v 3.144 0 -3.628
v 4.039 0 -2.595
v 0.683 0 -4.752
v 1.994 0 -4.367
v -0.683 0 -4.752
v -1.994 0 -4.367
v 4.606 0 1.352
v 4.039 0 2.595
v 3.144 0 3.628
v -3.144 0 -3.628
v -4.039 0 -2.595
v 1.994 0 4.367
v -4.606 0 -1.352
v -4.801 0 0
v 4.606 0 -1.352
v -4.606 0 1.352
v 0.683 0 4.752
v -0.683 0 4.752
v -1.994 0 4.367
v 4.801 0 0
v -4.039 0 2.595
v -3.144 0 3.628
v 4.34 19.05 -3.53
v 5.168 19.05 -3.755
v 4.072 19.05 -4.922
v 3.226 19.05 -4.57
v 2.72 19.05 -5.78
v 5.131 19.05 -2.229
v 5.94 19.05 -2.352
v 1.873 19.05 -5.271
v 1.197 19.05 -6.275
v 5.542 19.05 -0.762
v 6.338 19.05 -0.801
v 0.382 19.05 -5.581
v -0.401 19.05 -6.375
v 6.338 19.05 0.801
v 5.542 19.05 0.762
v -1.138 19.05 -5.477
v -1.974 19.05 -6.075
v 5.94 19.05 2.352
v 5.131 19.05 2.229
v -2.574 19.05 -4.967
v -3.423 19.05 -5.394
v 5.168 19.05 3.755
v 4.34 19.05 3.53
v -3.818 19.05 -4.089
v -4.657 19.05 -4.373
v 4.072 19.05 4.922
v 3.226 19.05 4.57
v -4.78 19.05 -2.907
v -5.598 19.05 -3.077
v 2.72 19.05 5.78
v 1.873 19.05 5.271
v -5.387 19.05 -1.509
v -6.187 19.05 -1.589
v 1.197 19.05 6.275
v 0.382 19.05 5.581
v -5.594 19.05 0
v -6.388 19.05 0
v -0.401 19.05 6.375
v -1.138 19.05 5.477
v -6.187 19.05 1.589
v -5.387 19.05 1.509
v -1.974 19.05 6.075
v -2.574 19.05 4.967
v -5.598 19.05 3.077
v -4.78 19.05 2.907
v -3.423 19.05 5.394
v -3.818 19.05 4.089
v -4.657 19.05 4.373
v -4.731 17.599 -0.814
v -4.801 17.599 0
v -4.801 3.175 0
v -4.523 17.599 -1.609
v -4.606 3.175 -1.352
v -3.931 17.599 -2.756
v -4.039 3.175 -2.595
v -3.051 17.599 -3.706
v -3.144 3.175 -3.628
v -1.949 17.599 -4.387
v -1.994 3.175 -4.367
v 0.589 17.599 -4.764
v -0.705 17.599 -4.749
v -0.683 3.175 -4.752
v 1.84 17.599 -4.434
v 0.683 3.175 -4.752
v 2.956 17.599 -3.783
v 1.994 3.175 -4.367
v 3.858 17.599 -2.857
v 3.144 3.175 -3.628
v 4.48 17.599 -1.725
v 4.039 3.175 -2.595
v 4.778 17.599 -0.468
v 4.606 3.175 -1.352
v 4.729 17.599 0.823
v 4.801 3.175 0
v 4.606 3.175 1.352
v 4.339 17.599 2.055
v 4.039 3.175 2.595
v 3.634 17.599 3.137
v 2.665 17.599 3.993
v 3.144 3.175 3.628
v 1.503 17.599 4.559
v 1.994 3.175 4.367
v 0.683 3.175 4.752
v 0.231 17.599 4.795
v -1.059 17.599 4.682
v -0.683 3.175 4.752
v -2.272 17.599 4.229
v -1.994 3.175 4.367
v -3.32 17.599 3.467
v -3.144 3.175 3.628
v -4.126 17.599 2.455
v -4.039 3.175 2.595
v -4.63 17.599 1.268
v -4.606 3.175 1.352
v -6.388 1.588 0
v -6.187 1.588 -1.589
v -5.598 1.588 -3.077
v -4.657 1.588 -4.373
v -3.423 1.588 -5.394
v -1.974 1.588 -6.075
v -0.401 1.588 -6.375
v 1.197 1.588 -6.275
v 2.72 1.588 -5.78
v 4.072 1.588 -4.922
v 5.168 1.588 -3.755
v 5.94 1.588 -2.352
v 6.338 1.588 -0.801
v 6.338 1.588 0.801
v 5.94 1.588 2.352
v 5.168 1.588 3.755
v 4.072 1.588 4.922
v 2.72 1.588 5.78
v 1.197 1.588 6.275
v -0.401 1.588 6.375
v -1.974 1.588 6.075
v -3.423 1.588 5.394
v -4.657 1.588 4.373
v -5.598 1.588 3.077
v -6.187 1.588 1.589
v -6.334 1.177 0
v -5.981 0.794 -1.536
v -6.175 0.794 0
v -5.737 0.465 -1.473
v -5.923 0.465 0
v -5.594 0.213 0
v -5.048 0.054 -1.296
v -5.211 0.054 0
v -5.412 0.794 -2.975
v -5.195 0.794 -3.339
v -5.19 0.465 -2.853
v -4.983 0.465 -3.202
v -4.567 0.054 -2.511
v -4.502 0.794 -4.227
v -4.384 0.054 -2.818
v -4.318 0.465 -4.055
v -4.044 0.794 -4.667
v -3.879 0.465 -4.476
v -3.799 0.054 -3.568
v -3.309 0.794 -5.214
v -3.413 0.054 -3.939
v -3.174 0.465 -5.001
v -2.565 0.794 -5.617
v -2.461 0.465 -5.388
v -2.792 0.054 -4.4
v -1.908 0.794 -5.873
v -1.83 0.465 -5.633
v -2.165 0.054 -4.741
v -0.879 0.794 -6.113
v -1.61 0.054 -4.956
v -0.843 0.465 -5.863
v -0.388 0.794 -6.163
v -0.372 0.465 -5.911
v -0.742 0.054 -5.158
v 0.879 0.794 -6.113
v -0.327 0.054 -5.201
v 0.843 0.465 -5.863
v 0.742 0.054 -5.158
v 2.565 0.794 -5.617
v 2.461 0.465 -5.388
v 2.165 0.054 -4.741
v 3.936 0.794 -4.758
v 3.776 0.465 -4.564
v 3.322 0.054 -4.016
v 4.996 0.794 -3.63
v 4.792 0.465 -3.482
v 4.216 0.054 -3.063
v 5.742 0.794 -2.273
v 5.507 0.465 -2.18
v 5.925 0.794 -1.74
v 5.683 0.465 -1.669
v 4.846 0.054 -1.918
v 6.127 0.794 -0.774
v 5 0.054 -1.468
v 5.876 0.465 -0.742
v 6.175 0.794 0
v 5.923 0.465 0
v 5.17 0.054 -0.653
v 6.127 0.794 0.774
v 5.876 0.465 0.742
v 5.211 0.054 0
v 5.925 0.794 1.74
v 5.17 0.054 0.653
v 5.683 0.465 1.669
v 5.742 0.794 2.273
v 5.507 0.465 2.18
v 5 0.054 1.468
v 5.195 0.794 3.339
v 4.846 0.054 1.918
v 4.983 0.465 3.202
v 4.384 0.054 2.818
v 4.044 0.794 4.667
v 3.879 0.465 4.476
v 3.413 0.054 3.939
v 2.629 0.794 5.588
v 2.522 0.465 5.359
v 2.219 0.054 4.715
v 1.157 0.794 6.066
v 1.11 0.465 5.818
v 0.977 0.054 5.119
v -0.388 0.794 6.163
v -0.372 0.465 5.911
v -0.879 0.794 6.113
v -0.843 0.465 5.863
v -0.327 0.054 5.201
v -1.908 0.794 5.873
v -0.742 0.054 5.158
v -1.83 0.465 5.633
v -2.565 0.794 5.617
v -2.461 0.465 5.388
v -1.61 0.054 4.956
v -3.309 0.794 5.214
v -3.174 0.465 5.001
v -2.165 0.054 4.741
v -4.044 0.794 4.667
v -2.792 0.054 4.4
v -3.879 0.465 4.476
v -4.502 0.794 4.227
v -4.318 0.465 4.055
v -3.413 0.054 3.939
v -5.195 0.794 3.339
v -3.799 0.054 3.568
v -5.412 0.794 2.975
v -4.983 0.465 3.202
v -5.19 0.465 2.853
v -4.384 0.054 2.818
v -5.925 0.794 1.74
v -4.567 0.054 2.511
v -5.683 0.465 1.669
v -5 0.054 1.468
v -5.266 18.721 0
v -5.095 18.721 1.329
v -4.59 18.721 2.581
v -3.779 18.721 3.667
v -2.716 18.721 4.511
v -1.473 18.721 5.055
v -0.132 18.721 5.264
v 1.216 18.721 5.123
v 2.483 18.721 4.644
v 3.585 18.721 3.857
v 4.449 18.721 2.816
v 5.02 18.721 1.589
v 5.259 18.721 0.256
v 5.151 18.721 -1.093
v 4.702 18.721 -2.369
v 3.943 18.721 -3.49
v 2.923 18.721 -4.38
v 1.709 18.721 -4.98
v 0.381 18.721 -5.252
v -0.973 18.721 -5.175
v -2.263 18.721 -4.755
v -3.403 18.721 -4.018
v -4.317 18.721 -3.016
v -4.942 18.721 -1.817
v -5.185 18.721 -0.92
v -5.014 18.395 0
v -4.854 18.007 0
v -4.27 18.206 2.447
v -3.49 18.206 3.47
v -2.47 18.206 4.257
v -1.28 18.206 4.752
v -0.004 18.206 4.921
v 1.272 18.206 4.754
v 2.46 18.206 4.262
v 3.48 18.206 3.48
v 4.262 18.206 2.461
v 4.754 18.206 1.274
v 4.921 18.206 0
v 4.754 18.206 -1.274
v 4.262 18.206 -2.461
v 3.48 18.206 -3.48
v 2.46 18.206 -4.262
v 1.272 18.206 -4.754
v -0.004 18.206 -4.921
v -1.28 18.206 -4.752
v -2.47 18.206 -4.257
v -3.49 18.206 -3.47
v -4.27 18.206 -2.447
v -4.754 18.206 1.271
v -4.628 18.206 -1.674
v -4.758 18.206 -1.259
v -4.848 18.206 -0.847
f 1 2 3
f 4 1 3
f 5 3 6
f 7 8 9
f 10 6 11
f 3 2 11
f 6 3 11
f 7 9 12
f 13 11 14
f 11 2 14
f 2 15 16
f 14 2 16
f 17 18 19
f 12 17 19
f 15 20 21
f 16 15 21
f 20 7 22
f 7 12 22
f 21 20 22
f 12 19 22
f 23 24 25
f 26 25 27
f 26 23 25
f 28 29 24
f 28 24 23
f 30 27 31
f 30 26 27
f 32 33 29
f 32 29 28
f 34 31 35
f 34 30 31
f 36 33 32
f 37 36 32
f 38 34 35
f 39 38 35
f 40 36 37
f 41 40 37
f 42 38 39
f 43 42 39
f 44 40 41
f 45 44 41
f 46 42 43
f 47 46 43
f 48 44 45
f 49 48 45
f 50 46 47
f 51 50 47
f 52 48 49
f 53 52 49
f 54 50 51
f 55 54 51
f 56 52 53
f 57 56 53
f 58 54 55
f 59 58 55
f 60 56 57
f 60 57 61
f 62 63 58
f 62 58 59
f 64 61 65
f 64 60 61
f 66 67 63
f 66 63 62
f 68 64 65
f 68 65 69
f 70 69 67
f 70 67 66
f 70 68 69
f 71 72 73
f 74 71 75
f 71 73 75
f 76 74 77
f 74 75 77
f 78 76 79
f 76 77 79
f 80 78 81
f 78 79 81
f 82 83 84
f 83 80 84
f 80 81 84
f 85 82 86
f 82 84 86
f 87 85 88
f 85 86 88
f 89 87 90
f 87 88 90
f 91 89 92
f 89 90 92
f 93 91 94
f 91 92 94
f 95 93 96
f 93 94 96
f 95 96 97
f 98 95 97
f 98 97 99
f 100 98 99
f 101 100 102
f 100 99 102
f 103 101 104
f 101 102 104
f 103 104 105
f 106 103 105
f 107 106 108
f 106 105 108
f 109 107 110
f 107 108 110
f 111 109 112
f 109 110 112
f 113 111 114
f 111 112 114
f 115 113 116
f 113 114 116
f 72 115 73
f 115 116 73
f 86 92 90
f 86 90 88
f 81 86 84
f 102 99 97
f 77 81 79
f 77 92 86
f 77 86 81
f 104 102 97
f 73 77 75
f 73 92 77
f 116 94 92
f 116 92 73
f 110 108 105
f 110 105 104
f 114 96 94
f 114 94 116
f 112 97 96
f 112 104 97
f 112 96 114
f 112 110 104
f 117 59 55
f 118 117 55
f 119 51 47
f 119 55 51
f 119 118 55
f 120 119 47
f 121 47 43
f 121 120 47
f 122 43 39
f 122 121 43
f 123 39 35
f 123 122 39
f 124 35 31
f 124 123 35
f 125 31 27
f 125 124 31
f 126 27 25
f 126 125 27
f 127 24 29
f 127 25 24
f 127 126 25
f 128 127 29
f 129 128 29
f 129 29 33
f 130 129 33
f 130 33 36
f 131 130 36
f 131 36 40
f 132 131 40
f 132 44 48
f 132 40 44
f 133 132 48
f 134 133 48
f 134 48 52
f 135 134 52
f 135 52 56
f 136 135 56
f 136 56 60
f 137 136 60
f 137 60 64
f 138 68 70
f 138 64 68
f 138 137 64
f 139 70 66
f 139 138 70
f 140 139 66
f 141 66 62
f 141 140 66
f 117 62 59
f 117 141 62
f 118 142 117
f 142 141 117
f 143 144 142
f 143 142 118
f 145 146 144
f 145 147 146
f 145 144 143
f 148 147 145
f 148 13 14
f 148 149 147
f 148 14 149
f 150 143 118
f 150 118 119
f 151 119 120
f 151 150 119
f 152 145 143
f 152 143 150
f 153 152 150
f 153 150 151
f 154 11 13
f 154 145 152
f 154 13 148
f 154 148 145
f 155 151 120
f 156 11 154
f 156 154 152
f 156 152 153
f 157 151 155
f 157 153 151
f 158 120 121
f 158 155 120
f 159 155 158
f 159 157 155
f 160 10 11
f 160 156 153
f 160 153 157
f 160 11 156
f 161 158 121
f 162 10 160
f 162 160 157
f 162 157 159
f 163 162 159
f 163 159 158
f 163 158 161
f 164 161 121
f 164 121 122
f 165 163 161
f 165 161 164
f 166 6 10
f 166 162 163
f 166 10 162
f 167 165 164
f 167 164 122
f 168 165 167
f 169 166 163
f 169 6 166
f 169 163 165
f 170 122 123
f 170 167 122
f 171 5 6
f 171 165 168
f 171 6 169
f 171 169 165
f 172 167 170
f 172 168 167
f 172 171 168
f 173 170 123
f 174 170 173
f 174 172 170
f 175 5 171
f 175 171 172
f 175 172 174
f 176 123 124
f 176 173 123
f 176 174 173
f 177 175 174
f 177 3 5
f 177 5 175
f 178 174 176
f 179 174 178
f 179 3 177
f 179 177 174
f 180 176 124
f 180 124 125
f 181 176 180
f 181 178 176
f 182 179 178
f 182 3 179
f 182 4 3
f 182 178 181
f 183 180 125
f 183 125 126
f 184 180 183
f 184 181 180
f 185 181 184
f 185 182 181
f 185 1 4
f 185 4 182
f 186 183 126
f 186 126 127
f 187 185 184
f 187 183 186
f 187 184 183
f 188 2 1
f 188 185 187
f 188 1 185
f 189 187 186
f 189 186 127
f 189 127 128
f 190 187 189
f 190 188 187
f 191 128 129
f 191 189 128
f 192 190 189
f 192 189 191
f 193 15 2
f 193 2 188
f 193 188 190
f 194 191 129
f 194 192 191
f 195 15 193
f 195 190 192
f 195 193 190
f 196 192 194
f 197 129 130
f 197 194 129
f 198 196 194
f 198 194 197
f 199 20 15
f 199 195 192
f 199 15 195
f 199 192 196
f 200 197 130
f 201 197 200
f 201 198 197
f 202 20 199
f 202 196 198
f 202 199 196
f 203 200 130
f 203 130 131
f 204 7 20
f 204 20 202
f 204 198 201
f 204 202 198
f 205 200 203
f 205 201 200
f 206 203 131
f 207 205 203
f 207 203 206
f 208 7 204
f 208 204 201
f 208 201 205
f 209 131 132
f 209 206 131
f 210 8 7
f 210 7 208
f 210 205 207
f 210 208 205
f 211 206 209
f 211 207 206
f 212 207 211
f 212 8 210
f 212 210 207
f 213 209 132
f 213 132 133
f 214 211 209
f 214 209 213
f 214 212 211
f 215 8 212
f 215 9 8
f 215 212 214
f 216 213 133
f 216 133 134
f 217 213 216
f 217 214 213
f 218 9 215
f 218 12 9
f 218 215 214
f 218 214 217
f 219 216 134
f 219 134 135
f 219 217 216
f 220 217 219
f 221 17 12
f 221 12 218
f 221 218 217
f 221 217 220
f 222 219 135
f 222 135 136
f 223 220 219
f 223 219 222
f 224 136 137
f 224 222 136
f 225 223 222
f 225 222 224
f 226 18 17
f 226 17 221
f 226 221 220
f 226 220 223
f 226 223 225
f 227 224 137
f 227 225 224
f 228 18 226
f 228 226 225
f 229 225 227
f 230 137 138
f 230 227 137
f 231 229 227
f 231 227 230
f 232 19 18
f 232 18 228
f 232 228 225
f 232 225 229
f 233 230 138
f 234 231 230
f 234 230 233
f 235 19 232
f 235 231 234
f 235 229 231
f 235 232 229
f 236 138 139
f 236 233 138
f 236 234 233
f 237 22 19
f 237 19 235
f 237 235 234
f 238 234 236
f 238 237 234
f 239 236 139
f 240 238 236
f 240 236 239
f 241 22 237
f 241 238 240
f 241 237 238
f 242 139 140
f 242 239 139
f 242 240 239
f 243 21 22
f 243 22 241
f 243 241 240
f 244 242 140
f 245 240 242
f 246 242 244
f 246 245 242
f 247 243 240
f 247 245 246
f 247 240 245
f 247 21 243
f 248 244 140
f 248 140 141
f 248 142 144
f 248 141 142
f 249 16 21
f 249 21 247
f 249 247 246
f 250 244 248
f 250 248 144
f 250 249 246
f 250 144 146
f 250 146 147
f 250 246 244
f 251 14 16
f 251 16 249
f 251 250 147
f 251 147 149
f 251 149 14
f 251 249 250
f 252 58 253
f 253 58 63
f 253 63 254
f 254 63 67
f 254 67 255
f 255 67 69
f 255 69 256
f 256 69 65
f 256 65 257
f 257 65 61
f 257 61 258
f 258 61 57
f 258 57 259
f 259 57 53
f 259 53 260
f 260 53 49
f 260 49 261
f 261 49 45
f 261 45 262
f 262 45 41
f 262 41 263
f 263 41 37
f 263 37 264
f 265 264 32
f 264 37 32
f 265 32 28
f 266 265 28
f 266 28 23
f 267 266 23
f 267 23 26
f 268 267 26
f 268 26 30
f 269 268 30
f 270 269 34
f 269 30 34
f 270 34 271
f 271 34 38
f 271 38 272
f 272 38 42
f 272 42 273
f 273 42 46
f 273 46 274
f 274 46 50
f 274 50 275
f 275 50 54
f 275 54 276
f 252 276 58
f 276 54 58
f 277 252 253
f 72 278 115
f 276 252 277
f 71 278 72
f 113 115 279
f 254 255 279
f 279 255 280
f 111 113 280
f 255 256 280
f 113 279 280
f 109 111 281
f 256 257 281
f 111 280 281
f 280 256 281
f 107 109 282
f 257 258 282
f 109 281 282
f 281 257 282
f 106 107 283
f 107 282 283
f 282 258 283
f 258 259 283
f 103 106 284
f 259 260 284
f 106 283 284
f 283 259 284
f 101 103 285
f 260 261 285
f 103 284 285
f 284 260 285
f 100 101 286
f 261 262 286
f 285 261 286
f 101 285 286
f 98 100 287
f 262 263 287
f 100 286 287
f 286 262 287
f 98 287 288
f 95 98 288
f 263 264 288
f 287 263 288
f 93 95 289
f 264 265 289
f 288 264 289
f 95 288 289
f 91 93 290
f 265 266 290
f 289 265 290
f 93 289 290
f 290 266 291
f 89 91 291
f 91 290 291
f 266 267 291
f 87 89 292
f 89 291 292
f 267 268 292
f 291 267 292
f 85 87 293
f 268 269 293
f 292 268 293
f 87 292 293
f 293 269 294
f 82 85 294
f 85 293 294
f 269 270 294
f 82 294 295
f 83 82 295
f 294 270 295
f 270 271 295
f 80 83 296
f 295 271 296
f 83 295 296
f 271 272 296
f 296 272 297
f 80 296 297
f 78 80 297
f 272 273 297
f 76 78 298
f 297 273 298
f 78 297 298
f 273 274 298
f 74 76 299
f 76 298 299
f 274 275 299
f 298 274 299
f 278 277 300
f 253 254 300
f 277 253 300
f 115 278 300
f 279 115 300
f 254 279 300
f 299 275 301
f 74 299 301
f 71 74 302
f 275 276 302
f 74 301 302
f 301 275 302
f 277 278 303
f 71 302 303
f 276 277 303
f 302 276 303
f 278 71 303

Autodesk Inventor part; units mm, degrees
ref_plane "YZ Plane" through (0, 0, 0) normal (1, 0, 0) x (0, 1, 0)
ref_plane "XZ Plane" through (0, 0, 0) normal (0, 1, 0) x (-1, 0, 0)
ref_plane "XY Plane" through (0, 0, 0) normal (0, 0, 1) x (1, 0, 0)
sketch "Sketch1" plane through (0, 0, 0) normal (0, 1, 0) x (-1, 0, 0)
  circle A0 centre (0, 0) radius 4.8006
  circle A1 centre (0, 0) radius 6.3881
  dimension "d0" = 9.6012
  dimension "d1" = 1.5875
extrude "Extrusion1" add sketch "Sketch1" along normal blind 19.05
extrude "Extrusion2" add sketch "Sketch1" along normal blind 3.175 contours A0
fillet "Fillet1" radius 1.5875 1 edges at (6.3881, 0, 0)
chamfer "Chamfer1" distance 0.7937 angle 45 1 edges at (4.8006, 19.05, 0)
fillet "Fillet2" radius 1.5875 1 edges at (4.8006, 18.2563, 0)
properties part number "137 V Dipole Cap"
